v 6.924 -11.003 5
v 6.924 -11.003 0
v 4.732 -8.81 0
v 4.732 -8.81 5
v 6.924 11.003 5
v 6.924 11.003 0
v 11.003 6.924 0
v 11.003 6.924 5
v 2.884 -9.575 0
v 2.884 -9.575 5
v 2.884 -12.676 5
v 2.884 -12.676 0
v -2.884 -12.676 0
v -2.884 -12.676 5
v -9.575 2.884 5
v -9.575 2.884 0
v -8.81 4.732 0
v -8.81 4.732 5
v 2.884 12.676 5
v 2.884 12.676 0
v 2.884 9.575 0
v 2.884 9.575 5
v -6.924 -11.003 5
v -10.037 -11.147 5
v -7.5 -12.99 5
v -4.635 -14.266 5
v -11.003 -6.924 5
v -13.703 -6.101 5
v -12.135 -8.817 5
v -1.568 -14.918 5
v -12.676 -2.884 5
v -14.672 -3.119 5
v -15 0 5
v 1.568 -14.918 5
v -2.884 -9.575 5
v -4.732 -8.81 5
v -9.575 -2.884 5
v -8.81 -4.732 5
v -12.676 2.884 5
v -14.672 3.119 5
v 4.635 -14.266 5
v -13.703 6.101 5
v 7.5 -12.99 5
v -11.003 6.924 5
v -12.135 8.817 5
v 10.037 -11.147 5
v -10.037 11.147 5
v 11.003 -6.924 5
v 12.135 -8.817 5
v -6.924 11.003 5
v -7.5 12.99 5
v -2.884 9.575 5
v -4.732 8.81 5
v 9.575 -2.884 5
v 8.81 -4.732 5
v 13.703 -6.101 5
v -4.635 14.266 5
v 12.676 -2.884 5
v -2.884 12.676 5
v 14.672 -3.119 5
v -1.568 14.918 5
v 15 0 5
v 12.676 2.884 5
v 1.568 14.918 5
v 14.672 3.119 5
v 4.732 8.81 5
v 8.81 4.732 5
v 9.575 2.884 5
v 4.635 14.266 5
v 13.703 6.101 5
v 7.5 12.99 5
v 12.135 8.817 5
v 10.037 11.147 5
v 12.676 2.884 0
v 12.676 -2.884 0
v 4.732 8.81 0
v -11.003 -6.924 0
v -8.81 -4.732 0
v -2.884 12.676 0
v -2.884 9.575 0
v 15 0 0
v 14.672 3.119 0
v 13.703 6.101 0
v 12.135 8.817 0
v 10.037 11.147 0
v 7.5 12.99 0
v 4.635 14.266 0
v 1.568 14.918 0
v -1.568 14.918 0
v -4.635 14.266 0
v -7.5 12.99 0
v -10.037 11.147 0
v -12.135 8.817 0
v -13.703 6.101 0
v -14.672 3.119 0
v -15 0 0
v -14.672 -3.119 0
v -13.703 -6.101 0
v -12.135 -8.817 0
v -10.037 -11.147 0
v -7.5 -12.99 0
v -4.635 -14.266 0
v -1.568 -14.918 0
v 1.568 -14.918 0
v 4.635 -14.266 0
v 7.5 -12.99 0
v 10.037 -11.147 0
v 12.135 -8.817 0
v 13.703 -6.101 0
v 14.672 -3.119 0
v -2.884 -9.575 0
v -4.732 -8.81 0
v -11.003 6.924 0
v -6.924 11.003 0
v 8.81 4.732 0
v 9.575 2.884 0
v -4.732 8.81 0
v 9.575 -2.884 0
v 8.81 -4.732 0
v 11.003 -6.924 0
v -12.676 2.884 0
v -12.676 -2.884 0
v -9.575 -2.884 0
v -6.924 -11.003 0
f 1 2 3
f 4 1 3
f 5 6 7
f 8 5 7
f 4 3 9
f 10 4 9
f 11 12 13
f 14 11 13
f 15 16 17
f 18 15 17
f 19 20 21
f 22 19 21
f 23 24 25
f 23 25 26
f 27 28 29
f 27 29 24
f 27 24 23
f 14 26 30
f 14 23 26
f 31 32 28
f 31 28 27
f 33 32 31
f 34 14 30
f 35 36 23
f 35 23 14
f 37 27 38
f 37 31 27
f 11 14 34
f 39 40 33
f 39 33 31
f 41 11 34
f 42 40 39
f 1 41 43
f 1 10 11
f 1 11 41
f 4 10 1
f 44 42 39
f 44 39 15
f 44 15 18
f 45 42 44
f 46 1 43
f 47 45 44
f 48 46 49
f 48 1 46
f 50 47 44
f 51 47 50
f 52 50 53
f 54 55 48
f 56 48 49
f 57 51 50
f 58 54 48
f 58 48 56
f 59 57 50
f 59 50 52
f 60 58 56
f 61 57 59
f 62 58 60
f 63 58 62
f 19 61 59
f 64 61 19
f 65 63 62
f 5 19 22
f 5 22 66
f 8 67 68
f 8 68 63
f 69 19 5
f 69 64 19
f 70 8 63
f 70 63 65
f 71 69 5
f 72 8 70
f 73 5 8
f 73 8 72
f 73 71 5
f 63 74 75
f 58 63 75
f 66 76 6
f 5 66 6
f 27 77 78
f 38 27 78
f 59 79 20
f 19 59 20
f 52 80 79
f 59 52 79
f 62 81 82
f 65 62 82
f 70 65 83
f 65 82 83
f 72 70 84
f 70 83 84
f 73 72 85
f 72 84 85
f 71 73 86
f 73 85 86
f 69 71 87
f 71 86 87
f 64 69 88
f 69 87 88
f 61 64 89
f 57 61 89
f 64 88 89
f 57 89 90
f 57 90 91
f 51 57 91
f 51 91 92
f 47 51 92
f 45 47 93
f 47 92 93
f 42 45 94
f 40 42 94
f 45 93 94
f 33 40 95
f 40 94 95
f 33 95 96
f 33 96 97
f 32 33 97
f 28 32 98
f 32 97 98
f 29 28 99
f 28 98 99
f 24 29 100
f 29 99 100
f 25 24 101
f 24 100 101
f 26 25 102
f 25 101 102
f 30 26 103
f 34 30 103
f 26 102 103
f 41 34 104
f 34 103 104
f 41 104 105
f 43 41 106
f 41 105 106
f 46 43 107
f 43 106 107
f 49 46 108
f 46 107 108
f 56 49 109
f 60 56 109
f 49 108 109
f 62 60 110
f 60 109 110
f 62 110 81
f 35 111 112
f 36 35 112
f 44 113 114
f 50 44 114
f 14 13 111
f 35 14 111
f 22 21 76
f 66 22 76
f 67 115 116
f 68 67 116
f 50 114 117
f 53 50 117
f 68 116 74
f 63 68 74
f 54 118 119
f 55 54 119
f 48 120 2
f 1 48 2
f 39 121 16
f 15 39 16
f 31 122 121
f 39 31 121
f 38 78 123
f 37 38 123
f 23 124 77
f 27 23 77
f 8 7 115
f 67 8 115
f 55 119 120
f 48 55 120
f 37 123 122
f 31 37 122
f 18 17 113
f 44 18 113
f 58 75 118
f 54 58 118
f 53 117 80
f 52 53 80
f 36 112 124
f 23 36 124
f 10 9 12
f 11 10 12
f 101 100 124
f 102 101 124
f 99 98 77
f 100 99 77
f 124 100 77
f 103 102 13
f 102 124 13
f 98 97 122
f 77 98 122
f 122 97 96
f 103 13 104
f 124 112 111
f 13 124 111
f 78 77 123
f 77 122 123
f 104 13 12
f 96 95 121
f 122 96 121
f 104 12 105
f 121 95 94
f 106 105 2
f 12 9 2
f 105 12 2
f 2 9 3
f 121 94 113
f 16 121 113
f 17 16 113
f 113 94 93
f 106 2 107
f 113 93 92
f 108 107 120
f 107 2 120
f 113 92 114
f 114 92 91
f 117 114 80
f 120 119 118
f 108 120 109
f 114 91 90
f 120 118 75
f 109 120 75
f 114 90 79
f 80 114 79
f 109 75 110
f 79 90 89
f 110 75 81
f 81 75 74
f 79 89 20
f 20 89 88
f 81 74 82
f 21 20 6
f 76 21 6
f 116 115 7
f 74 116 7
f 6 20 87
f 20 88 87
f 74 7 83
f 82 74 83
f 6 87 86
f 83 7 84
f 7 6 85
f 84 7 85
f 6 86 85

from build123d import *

# Parameters (mm, degrees)
SKETCH_R  = 15
PAD_DEPTH = 5


with BuildPart() as part:
    # Sketch → Pad (new body)
    with BuildSketch(Plane.XY):
        Circle(SKETCH_R)
        Polygon((0, 12.676114), (2.883773, 12.676114), (2.883773, 9.575169), (4.731532, 8.809802), (6.924231, 11.002501), (11.002501, 6.924231), (8.809802, 4.731532), (9.575169, 2.883773), (12.676114, 2.883773), (12.676114, 0), (12.676114, -2.883773), (9.575169, -2.883773), (8.809802, -4.731532), (11.002501, -6.924231), (6.924231, -11.002501), (4.731532, -8.809802), (2.883773, -9.575169), (2.883773, -12.676114), (0, -12.676114), (-2.883773, -12.676114), (-2.883773, -9.575169), (-4.731532, -8.809802), (-6.924231, -11.002501), (-11.002501, -6.924231), (-8.809802, -4.731532), (-9.575169, -2.883773), (-12.676114, -2.883773), (-12.676114, 0), (-12.676114, 2.883773), (-9.575169, 2.883773), (-8.809802, 4.731532), (-11.002501, 6.924231), (-6.924231, 11.002501), (-4.731532, 8.809802), (-2.883773, 9.575169), (-2.883773, 12.676114), align=None, mode=Mode.SUBTRACT)
    extrude(amount=PAD_DEPTH)


solid = part.part
